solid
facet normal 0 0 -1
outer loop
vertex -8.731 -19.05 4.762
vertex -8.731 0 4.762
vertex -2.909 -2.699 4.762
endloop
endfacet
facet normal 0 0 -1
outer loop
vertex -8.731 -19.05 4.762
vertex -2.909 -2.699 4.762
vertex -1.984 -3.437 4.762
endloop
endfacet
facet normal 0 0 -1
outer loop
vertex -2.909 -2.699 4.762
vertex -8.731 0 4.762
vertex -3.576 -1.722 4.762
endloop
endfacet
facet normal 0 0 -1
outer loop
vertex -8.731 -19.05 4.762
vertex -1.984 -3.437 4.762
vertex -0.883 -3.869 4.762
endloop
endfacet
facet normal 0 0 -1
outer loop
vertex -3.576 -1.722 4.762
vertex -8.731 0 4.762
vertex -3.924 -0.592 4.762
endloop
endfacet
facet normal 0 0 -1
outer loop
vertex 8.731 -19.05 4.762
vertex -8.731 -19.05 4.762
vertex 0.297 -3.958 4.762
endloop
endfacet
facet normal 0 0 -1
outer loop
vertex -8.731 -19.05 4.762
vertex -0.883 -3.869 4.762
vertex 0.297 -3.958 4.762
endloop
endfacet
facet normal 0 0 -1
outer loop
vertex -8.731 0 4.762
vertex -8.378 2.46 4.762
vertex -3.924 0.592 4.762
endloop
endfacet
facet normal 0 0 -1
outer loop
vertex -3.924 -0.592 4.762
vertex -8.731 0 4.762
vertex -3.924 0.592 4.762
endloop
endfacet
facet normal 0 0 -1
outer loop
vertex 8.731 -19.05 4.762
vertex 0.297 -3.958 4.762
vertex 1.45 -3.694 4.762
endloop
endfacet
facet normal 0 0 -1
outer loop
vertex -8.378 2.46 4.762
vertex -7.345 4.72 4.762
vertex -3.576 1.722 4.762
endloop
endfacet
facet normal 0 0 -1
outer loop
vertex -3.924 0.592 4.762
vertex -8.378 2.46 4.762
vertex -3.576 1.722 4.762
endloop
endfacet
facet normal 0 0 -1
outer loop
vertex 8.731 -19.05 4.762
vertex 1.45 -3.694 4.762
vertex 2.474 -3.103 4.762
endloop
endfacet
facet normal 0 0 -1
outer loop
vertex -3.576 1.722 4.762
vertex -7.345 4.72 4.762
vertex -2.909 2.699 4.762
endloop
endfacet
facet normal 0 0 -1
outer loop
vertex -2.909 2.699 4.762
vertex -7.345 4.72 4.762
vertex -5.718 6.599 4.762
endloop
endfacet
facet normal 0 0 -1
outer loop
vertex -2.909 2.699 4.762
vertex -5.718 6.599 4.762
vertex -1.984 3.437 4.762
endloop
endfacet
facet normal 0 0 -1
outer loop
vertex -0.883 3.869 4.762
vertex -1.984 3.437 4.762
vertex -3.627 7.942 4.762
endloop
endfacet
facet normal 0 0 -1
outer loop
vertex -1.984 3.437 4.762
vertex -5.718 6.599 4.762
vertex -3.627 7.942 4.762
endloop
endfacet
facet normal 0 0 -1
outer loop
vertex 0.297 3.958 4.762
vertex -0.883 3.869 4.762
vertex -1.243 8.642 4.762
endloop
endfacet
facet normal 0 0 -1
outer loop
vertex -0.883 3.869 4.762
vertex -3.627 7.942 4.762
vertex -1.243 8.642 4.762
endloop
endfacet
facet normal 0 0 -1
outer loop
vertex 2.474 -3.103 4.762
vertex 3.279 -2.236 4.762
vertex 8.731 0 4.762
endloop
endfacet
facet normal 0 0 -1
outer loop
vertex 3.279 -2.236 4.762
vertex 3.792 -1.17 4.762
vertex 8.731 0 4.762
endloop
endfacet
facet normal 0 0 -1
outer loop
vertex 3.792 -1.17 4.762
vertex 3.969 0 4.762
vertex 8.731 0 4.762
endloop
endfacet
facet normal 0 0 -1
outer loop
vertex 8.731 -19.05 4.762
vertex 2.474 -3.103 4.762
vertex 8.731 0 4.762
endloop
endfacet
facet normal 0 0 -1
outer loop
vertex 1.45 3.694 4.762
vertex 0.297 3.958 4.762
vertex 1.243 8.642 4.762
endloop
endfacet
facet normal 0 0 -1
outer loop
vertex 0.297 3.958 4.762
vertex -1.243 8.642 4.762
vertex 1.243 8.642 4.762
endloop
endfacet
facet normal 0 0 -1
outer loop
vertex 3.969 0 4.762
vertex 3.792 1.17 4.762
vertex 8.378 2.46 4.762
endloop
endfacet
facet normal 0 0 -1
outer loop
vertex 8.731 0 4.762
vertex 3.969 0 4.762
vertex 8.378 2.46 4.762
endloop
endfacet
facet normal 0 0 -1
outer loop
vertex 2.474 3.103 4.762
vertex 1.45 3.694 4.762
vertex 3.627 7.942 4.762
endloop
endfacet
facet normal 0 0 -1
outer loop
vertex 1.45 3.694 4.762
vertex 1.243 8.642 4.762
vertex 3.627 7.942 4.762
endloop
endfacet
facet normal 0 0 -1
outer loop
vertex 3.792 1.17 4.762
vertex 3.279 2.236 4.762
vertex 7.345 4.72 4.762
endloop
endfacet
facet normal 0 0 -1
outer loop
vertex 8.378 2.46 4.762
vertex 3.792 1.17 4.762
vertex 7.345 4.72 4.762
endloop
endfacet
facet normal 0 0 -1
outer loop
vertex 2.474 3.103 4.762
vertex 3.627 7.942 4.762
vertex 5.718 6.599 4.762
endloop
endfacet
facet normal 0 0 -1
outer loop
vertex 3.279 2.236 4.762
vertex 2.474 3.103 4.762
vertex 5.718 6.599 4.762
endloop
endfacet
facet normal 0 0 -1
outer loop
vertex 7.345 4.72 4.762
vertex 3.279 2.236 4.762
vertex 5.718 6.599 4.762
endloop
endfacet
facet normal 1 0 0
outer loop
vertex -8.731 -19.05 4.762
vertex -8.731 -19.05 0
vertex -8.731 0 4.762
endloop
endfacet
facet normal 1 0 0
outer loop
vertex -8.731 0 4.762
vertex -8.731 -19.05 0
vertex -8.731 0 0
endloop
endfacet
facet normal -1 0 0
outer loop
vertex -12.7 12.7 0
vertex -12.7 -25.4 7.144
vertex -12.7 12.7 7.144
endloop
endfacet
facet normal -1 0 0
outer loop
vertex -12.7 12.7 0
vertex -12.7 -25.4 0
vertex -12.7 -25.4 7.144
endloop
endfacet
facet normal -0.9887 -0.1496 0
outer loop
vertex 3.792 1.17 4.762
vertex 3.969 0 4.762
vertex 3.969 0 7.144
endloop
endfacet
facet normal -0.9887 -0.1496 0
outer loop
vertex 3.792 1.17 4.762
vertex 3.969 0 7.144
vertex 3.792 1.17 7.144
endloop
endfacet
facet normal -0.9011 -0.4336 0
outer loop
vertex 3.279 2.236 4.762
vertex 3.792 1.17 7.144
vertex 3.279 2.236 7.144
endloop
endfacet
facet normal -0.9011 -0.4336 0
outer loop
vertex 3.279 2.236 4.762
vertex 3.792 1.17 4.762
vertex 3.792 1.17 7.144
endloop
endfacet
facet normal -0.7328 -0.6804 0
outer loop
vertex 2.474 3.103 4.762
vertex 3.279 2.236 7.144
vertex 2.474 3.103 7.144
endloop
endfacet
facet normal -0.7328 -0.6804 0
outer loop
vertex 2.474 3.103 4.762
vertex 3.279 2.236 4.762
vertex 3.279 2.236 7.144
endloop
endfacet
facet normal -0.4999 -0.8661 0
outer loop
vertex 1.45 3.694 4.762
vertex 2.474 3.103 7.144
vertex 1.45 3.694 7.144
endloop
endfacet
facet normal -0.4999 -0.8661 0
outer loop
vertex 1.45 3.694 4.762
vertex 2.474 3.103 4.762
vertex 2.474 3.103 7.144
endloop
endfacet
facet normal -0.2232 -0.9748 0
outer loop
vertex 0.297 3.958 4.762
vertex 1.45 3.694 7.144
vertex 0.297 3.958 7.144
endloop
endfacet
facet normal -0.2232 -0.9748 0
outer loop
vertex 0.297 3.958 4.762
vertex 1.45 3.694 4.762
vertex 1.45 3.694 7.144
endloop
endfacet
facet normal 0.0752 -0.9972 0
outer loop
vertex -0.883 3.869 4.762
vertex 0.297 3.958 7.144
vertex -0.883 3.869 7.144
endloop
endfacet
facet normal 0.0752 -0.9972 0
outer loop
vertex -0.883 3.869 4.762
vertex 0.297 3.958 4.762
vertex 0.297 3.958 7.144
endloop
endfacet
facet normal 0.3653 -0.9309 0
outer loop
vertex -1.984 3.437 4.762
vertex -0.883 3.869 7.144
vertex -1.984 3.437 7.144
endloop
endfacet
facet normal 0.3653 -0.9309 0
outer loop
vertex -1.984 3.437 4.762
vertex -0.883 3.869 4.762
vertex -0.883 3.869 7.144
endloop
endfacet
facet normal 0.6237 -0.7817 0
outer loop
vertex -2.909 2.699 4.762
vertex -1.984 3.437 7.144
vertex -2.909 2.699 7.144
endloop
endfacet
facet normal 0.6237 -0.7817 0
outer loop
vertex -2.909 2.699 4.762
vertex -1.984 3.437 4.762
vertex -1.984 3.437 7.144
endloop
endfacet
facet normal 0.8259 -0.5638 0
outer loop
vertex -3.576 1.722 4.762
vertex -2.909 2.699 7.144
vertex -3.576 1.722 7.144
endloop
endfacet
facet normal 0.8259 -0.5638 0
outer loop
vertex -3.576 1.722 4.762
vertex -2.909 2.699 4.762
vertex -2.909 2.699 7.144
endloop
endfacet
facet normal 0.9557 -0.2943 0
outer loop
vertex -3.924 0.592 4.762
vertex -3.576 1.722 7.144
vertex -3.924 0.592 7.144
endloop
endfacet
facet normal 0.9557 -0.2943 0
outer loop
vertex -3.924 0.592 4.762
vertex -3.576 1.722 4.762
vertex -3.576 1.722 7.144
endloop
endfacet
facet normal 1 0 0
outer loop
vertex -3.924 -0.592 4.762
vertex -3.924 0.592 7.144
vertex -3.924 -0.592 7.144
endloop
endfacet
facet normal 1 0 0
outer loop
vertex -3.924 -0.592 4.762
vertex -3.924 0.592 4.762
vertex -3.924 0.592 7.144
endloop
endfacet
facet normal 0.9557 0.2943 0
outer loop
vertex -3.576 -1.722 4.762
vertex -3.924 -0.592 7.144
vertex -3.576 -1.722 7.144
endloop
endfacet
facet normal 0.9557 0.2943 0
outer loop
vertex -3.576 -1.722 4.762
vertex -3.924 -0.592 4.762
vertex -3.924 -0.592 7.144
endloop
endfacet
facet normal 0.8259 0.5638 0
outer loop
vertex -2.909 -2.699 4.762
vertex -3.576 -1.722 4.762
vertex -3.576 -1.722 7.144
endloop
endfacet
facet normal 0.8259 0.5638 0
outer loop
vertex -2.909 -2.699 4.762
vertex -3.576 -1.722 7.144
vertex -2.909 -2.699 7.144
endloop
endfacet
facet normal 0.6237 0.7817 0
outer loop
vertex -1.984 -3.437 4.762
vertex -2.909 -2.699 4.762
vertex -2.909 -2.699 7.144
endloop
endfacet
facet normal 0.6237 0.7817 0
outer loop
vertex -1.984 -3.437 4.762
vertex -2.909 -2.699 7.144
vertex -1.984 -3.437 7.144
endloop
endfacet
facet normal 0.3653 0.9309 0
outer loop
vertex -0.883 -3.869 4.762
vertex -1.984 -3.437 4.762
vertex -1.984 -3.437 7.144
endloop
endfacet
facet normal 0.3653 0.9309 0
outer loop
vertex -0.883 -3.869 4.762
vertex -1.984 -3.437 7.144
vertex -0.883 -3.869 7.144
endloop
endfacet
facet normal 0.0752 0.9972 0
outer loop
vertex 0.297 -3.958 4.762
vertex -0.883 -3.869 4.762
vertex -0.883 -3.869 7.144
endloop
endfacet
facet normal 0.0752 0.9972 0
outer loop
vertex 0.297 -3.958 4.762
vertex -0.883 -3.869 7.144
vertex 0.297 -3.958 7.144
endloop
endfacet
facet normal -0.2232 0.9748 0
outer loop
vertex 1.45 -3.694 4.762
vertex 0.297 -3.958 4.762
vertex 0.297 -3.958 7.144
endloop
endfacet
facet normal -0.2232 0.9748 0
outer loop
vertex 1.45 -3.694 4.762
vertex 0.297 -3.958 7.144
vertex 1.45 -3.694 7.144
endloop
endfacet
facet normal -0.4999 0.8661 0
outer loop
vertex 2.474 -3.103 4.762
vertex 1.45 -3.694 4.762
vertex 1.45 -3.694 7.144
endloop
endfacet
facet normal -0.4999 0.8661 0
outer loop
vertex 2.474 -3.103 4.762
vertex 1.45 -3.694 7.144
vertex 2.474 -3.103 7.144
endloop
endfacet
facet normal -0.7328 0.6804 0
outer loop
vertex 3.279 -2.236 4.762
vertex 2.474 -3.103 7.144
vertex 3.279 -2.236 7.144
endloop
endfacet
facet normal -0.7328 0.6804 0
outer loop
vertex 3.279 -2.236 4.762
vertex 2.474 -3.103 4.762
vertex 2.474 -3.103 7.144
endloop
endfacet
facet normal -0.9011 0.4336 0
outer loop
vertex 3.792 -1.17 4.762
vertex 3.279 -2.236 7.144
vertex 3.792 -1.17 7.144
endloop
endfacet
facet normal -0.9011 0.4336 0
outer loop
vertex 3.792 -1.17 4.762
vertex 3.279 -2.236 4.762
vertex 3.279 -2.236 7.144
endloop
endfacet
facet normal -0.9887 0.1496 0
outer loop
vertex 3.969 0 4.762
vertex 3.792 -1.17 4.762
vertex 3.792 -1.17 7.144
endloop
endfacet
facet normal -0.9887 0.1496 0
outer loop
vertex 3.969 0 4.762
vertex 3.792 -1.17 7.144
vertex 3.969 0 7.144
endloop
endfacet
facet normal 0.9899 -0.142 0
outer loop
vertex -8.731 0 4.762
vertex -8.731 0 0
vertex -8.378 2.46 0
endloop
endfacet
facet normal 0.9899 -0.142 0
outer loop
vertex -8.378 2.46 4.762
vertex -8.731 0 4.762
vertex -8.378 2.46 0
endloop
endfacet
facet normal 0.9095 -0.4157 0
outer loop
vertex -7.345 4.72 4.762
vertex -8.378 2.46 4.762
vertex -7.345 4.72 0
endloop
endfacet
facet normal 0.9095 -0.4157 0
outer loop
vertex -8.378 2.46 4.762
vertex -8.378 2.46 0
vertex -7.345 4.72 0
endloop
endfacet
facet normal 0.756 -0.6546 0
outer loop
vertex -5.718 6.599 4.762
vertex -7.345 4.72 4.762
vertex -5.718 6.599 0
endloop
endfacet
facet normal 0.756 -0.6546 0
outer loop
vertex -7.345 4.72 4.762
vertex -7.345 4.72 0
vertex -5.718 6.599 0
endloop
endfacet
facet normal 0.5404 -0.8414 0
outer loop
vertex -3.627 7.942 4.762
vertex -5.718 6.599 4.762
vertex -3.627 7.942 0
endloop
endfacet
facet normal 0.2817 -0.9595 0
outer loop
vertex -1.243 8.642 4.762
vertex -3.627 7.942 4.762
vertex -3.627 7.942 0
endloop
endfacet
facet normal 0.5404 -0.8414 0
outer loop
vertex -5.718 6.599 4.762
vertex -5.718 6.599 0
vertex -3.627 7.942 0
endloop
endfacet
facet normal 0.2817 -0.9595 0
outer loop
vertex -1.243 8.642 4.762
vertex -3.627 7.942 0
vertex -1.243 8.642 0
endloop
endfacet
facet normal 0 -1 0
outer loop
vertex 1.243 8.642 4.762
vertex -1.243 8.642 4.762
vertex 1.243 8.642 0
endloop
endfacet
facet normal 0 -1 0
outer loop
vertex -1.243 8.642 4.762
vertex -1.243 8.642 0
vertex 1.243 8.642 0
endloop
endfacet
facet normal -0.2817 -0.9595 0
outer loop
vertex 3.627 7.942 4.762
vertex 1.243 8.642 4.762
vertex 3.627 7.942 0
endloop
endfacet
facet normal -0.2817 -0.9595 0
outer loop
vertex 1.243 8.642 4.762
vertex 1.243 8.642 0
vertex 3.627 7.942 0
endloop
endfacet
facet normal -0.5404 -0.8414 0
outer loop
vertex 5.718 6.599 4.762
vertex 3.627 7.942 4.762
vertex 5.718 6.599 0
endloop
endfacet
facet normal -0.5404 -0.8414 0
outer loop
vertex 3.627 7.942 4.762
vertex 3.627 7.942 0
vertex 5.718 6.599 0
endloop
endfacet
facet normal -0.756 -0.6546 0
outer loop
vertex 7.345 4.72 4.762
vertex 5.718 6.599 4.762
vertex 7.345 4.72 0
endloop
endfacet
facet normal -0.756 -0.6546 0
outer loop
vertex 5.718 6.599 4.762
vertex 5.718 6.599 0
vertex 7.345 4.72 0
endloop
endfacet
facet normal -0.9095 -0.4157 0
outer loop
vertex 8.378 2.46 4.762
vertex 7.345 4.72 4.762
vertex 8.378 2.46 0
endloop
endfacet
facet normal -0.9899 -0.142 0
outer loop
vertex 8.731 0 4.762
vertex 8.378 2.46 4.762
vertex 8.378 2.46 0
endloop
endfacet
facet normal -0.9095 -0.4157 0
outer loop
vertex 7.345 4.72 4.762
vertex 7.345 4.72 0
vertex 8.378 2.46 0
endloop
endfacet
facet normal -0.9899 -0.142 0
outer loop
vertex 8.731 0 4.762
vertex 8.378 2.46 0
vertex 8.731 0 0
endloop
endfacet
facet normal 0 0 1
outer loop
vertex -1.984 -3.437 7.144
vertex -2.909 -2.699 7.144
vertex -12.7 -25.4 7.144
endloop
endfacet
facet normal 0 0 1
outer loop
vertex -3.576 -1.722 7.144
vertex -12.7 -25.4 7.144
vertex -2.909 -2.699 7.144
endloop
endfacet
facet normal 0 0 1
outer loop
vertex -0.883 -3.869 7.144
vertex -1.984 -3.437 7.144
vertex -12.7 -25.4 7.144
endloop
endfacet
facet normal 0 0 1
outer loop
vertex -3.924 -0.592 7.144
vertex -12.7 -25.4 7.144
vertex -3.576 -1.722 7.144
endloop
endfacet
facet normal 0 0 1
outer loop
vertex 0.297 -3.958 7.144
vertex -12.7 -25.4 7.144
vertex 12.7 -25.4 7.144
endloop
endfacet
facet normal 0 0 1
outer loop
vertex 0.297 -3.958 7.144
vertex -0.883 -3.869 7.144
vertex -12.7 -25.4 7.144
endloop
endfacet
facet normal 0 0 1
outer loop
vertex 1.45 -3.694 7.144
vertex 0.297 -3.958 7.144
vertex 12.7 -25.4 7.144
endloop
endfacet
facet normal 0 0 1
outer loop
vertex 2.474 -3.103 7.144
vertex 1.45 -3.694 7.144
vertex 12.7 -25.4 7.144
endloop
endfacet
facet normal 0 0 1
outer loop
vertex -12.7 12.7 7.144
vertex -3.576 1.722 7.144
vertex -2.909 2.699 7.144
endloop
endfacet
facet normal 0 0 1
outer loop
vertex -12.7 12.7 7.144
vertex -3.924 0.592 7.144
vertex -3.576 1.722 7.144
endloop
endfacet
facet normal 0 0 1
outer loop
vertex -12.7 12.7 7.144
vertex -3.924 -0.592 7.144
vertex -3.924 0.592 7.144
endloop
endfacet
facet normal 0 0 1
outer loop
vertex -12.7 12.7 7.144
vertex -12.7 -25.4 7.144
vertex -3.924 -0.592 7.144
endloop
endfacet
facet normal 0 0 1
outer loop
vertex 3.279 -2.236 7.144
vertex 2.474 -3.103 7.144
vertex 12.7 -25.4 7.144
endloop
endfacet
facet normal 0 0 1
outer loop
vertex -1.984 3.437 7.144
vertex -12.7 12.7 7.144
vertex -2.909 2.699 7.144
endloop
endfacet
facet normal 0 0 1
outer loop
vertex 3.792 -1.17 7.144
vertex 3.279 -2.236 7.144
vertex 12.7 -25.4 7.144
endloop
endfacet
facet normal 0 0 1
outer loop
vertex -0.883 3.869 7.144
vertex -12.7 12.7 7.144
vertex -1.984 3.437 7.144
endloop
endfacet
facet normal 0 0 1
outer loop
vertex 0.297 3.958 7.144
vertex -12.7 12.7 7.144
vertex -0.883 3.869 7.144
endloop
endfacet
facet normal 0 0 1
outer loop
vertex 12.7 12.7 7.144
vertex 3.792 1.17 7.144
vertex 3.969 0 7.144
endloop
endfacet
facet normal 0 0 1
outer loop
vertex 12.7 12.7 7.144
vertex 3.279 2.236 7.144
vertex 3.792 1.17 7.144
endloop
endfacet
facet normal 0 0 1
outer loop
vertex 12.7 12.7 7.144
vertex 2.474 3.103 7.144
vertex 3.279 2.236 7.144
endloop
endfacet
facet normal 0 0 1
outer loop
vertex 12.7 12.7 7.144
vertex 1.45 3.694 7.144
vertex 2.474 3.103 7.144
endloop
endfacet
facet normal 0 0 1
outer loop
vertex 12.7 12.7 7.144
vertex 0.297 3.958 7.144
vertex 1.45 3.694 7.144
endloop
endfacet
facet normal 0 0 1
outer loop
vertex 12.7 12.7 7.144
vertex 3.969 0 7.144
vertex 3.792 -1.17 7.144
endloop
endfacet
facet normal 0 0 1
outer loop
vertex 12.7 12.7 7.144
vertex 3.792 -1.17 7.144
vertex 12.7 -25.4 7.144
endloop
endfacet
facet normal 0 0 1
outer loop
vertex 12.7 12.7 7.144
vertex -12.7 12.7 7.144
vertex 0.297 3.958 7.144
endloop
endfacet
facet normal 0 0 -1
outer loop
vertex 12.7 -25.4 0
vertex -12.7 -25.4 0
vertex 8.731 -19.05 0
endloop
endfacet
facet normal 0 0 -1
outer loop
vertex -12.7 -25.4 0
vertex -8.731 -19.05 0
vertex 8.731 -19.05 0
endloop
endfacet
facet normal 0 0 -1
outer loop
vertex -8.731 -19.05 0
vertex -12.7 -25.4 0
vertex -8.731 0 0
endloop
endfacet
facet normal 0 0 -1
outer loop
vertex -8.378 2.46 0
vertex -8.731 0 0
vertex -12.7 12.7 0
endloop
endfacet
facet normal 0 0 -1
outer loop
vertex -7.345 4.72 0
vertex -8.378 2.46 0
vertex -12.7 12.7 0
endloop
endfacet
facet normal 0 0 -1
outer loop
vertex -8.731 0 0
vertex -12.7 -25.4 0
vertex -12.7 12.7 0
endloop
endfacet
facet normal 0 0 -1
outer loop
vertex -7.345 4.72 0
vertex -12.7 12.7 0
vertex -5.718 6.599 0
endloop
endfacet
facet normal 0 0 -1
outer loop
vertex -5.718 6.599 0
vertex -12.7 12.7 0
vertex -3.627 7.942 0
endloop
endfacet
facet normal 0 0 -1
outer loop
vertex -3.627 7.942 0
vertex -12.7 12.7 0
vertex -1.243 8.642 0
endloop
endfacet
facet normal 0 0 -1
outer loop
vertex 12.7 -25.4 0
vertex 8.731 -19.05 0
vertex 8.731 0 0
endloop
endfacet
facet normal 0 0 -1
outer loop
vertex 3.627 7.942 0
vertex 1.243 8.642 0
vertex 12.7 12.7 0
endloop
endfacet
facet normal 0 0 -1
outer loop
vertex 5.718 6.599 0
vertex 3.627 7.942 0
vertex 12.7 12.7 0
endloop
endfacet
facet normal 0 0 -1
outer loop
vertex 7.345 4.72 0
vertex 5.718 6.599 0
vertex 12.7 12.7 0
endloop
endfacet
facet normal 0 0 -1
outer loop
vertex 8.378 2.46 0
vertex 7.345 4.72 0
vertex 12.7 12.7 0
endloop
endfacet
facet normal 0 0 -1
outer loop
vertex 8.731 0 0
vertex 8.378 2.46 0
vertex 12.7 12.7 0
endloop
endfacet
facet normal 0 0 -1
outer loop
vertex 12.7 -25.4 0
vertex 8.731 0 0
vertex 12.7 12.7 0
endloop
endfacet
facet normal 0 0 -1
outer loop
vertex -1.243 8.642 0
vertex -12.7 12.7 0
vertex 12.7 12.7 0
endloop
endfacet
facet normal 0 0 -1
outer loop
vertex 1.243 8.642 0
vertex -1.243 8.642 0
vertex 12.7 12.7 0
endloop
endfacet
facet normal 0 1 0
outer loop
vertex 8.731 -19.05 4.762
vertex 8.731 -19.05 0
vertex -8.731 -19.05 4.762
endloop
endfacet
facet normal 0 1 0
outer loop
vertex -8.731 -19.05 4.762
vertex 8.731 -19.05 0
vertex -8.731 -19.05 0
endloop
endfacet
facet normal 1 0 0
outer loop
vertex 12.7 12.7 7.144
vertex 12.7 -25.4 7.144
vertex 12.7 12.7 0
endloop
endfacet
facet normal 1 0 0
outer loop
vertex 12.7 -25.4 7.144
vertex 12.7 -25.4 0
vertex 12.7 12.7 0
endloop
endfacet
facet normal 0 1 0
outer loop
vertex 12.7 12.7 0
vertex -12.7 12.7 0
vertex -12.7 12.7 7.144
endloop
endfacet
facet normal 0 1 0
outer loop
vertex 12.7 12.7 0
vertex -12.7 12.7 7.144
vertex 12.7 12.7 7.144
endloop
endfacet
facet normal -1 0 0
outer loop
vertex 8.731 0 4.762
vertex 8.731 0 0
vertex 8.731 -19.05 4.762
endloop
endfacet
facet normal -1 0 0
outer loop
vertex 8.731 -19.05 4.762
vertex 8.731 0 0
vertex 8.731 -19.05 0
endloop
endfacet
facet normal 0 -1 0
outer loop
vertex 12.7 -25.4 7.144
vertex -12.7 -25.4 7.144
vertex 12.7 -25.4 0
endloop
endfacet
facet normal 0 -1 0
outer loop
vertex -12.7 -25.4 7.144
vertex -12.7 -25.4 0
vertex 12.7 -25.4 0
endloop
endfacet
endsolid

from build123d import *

# Parameters (mm, degrees)
F0_W     = 25.4
F0_H     = 38.1
F1_DEPTH = 4.7625
F2_W     = 25.4
F2_H     = 38.1
F2_R     = 3.96875
F3_DEPTH = 2.38125


# Not quite as in the source:
# - a length typed as a fraction of an inch, garbled in the dataset ("3 / 203.2 mm" for 3/8 in), is restored


with BuildPart() as f1:
    # F0 (on Top) → F1 (new body)
    with BuildSketch(Plane.XY):
        with Locations((0, -6.35)):
            Rectangle(F0_W, F0_H)
        with BuildLine():
            ThreePointArc((-8.73125, 0), (0, 8.73125), (8.73125, 0))
            Line((8.73125, 0), (8.73125, -19.05))
            Line((8.73125, -19.05), (-8.73125, -19.05))
            Line((-8.73125, -19.05), (-8.73125, 0))
        make_face(mode=Mode.SUBTRACT)
    extrude(amount=F1_DEPTH)

    # F2 (on face) → F3 (join)
    with BuildSketch(Plane.XY.offset(4.7625)):
        with Locations((0, -6.35)):
            Rectangle(F2_W, F2_H)
        Circle(F2_R, mode=Mode.SUBTRACT)
    extrude(amount=F3_DEPTH)


solid = f1.part
